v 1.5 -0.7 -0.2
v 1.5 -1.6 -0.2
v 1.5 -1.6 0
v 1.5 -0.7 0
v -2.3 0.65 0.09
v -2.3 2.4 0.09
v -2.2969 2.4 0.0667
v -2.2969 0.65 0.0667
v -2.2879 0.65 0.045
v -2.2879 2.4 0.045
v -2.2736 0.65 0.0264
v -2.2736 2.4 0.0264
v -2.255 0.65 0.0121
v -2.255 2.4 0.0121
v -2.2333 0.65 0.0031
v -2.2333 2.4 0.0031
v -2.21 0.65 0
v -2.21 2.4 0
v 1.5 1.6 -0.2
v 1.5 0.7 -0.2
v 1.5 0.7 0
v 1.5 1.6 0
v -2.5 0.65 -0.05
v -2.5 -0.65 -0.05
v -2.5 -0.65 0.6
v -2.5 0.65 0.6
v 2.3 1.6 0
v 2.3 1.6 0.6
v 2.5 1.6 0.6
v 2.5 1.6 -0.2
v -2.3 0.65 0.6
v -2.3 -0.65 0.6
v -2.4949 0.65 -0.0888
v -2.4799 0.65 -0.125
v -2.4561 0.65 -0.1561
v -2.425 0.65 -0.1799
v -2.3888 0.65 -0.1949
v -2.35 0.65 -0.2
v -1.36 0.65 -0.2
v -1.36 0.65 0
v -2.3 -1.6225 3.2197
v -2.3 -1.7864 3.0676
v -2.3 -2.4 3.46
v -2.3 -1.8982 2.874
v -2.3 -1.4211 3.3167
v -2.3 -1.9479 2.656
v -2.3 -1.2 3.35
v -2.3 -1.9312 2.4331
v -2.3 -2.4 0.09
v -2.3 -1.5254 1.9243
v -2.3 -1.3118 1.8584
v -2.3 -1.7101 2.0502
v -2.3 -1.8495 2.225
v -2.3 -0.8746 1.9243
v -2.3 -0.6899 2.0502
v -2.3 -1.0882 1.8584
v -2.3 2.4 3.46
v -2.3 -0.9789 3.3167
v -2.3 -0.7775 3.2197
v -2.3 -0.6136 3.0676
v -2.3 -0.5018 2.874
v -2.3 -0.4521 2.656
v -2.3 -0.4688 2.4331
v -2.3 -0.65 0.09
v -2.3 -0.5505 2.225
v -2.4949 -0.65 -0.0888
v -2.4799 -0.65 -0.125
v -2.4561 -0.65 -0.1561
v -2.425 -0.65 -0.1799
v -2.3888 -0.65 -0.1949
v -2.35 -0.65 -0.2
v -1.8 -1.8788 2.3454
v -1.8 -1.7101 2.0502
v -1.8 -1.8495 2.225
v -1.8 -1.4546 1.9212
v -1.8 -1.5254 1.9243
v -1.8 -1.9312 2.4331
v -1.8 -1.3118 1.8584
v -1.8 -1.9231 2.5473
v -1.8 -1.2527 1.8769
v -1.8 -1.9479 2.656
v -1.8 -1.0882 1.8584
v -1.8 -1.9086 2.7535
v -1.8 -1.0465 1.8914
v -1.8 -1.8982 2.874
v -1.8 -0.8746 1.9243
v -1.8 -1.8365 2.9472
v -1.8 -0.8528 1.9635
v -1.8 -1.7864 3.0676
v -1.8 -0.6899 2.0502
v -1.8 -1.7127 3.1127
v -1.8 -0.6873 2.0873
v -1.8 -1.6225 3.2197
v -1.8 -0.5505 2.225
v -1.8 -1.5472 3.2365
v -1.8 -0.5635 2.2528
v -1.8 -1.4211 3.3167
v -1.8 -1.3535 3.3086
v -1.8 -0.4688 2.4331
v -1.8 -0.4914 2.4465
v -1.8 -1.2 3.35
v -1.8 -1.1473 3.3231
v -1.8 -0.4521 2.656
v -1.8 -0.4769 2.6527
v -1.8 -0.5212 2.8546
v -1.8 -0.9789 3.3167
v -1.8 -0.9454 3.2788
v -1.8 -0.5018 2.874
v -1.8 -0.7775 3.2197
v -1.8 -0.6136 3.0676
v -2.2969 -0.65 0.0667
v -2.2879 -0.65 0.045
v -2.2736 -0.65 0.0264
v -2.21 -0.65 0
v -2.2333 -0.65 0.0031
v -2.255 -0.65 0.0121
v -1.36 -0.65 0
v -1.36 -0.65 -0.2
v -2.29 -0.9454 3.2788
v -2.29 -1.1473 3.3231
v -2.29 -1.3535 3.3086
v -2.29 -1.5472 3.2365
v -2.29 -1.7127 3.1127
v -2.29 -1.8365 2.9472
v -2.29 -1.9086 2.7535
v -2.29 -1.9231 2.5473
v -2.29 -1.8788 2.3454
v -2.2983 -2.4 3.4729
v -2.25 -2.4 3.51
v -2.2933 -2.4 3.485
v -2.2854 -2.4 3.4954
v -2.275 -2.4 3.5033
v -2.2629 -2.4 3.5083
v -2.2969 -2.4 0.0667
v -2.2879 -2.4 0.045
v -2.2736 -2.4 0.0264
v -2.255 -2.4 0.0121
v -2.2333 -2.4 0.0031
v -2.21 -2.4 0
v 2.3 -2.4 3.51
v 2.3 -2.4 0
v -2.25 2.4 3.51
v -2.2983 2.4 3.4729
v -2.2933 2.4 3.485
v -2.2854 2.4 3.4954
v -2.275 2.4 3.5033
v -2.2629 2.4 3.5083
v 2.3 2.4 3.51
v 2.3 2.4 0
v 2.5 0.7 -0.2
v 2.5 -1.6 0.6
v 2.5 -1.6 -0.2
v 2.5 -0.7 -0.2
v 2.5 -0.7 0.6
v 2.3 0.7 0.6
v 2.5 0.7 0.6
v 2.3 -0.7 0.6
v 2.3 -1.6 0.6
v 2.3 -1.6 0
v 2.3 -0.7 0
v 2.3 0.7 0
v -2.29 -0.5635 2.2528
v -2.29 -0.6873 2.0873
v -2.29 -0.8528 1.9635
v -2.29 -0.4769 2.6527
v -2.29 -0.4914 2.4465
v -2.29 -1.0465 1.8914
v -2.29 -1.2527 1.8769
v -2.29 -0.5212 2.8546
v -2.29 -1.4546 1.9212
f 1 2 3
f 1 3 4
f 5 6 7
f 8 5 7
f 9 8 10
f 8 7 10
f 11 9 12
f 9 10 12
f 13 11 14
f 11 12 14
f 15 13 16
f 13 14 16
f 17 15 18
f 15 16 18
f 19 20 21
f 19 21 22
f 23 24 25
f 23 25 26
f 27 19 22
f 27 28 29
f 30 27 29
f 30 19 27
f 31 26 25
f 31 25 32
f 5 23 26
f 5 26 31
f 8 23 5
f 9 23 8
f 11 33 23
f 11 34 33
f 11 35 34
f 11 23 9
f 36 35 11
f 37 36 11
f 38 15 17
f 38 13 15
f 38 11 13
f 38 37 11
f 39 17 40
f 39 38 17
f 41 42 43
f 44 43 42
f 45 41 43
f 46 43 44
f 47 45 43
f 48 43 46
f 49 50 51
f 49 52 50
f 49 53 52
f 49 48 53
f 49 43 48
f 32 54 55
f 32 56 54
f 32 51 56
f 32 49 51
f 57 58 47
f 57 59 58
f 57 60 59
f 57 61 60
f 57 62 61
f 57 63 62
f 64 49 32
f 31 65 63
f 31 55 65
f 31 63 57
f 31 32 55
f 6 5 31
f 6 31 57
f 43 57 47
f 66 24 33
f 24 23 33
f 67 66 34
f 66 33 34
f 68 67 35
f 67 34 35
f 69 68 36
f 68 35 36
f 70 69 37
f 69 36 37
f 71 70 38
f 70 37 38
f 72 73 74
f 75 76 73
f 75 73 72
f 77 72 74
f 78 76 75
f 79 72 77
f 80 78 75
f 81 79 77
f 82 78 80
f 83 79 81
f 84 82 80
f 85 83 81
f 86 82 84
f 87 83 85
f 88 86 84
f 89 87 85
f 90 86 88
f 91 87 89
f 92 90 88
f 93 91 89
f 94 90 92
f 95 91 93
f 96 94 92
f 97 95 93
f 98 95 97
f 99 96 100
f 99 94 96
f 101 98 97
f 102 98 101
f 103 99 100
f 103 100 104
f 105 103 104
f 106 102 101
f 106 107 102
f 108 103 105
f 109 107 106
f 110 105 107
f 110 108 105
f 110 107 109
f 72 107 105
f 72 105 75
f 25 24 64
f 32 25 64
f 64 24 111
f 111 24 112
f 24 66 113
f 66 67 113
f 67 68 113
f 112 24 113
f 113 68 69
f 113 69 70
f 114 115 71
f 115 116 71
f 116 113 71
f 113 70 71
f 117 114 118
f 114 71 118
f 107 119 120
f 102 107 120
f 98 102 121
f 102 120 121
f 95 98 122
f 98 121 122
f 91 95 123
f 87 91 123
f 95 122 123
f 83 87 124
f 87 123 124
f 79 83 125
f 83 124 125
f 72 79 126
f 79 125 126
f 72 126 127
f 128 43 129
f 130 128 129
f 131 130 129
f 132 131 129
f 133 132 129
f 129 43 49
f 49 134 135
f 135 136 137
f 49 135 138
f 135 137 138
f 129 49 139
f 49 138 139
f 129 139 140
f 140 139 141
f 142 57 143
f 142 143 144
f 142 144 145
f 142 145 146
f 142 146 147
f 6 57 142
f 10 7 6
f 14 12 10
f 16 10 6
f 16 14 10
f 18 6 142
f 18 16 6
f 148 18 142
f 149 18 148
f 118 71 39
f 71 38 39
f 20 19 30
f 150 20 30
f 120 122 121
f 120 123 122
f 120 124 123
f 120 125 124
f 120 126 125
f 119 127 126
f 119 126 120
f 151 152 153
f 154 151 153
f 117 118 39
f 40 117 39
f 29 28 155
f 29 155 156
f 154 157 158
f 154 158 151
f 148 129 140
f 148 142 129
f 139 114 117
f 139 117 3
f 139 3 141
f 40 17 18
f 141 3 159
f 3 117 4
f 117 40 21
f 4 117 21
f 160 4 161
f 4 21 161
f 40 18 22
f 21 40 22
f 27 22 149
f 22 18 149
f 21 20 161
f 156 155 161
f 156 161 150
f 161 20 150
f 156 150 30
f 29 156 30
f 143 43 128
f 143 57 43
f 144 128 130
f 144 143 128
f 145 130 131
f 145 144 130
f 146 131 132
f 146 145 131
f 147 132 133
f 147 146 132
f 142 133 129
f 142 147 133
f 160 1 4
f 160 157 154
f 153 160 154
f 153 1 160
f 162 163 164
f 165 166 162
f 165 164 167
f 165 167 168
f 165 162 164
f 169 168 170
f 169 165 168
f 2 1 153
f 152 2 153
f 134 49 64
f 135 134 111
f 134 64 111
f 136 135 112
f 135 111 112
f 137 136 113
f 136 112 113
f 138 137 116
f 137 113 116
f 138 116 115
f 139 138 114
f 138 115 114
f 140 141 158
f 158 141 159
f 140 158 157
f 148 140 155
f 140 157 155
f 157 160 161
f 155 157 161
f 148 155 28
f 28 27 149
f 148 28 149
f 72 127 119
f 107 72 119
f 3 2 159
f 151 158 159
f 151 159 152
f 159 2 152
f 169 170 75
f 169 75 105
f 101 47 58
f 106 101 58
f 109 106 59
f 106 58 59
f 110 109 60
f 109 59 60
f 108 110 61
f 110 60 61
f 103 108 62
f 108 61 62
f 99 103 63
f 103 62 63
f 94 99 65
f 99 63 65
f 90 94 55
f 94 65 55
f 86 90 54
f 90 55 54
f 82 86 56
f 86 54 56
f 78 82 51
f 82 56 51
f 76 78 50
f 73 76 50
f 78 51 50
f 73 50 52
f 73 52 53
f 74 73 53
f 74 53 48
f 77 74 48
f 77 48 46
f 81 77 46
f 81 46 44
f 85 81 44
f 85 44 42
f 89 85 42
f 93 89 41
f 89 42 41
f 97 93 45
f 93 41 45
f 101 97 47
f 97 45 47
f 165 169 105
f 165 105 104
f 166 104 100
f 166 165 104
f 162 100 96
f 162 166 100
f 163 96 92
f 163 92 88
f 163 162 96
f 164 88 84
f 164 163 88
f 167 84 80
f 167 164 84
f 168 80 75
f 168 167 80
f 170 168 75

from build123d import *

# Parameters (mm, degrees)
SKETCH1_W           = 4.6
SKETCH1_H           = 4.8
BOSS_EXTRUDE1_DEPTH = 3.51
FILLET1_R           = 0.09
SKETCH2_W           = 1.14
SKETCH2_H           = 1.3
SKETCH2_W_2         = 1
SKETCH2_H_2         = 0.9
BOSS_EXTRUDE2_DEPTH = 0.8
FILLET2_R           = 0.15
SKETCH3_R           = 0.75
CUT_EXTRUDE1_DEPTH  = 0.5
FILLET3_R           = 0.05
SKETCH4_R           = 0.725
CUT_EXTRUDE2_DEPTH  = 0.01


with BuildPart() as part:
    # Sketch1 → Boss-Extrude1 (new body)
    with BuildSketch(Plane.XY):
        Rectangle(SKETCH1_W, SKETCH1_H)
    extrude(amount=BOSS_EXTRUDE1_DEPTH)

    # Fillet1
    fillet1_edges = [part.edges().sort_by_distance(p)[0] for p in [
        (-2.3, 0, 0),
    ]]
    fillet(fillet1_edges, radius=FILLET1_R)

    # Sketch2 → Boss-Extrude2 (add)
    with BuildSketch(Plane.XY.offset(-0.2)):
        with Locations((-1.93, 0)):
            Rectangle(SKETCH2_W, SKETCH2_H)
        with Locations((2, 1.15)):
            Rectangle(SKETCH2_W_2, SKETCH2_H_2)
        with Locations((2, -1.15)):
            Rectangle(SKETCH2_W_2, SKETCH2_H_2)
    extrude(amount=BOSS_EXTRUDE2_DEPTH)

    # Fillet2
    fillet2_edges = [part.edges().sort_by_distance(p)[0] for p in [
        (-2.5, 0, -0.2),
    ]]
    fillet(fillet2_edges, radius=FILLET2_R)

    # Sketch3 → Cut-Extrude1 (cut)
    with BuildSketch(Plane.ZY.offset(2.3)):
        with Locations((2.6, -1.2)):
            Circle(SKETCH3_R)
        with BuildLine():
            Line((1.921164098, -1.454571833), (2.854571833, -0.521164098))
            ThreePointArc((2.854571833, -0.521164098), (2.087347584, -0.687347584), (1.921164098, -1.454571833))
        make_face(mode=Mode.SUBTRACT)
        with BuildLine():
            Line((2.345428167, -1.878835902), (3.278835902, -0.945428167))
            ThreePointArc((3.278835902, -0.945428167), (3.112652416, -1.712652416), (2.345428167, -1.878835902))
        make_face(mode=Mode.SUBTRACT)
    extrude(amount=-CUT_EXTRUDE1_DEPTH, mode=Mode.SUBTRACT)

    # Fillet3
    fillet3_edges = [part.edges().sort_by_distance(p)[0] for p in [
        (-2.3, 0, 3.51),
    ]]
    fillet(fillet3_edges, radius=FILLET3_R)

    # Sketch4 → Cut-Extrude2 (cut)
    with BuildSketch(Plane.ZY.offset(2.3)):
        with Locations((2.6, -1.2)):
            Circle(SKETCH4_R)
    extrude(amount=-CUT_EXTRUDE2_DEPTH, mode=Mode.SUBTRACT)


solid = part.part
